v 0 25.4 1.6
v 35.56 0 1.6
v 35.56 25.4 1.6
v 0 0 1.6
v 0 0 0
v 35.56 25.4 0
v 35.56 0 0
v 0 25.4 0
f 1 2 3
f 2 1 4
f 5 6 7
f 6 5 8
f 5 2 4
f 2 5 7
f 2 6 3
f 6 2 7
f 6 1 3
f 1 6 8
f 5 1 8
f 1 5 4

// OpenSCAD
$fn = 64;

// PCB dimensions (mm)
pcb_x  = 35.56;
pcb_y  = 25.4;
pcb_th = 1.6;

module pcb_rect(x, y, th) {
    // Sharp rectangular outline with exact dimensions
    cube([x, y, th], center=false);
}

color([0.05, 0.45, 0.18])
pcb_rect(pcb_x, pcb_y, pcb_th);
